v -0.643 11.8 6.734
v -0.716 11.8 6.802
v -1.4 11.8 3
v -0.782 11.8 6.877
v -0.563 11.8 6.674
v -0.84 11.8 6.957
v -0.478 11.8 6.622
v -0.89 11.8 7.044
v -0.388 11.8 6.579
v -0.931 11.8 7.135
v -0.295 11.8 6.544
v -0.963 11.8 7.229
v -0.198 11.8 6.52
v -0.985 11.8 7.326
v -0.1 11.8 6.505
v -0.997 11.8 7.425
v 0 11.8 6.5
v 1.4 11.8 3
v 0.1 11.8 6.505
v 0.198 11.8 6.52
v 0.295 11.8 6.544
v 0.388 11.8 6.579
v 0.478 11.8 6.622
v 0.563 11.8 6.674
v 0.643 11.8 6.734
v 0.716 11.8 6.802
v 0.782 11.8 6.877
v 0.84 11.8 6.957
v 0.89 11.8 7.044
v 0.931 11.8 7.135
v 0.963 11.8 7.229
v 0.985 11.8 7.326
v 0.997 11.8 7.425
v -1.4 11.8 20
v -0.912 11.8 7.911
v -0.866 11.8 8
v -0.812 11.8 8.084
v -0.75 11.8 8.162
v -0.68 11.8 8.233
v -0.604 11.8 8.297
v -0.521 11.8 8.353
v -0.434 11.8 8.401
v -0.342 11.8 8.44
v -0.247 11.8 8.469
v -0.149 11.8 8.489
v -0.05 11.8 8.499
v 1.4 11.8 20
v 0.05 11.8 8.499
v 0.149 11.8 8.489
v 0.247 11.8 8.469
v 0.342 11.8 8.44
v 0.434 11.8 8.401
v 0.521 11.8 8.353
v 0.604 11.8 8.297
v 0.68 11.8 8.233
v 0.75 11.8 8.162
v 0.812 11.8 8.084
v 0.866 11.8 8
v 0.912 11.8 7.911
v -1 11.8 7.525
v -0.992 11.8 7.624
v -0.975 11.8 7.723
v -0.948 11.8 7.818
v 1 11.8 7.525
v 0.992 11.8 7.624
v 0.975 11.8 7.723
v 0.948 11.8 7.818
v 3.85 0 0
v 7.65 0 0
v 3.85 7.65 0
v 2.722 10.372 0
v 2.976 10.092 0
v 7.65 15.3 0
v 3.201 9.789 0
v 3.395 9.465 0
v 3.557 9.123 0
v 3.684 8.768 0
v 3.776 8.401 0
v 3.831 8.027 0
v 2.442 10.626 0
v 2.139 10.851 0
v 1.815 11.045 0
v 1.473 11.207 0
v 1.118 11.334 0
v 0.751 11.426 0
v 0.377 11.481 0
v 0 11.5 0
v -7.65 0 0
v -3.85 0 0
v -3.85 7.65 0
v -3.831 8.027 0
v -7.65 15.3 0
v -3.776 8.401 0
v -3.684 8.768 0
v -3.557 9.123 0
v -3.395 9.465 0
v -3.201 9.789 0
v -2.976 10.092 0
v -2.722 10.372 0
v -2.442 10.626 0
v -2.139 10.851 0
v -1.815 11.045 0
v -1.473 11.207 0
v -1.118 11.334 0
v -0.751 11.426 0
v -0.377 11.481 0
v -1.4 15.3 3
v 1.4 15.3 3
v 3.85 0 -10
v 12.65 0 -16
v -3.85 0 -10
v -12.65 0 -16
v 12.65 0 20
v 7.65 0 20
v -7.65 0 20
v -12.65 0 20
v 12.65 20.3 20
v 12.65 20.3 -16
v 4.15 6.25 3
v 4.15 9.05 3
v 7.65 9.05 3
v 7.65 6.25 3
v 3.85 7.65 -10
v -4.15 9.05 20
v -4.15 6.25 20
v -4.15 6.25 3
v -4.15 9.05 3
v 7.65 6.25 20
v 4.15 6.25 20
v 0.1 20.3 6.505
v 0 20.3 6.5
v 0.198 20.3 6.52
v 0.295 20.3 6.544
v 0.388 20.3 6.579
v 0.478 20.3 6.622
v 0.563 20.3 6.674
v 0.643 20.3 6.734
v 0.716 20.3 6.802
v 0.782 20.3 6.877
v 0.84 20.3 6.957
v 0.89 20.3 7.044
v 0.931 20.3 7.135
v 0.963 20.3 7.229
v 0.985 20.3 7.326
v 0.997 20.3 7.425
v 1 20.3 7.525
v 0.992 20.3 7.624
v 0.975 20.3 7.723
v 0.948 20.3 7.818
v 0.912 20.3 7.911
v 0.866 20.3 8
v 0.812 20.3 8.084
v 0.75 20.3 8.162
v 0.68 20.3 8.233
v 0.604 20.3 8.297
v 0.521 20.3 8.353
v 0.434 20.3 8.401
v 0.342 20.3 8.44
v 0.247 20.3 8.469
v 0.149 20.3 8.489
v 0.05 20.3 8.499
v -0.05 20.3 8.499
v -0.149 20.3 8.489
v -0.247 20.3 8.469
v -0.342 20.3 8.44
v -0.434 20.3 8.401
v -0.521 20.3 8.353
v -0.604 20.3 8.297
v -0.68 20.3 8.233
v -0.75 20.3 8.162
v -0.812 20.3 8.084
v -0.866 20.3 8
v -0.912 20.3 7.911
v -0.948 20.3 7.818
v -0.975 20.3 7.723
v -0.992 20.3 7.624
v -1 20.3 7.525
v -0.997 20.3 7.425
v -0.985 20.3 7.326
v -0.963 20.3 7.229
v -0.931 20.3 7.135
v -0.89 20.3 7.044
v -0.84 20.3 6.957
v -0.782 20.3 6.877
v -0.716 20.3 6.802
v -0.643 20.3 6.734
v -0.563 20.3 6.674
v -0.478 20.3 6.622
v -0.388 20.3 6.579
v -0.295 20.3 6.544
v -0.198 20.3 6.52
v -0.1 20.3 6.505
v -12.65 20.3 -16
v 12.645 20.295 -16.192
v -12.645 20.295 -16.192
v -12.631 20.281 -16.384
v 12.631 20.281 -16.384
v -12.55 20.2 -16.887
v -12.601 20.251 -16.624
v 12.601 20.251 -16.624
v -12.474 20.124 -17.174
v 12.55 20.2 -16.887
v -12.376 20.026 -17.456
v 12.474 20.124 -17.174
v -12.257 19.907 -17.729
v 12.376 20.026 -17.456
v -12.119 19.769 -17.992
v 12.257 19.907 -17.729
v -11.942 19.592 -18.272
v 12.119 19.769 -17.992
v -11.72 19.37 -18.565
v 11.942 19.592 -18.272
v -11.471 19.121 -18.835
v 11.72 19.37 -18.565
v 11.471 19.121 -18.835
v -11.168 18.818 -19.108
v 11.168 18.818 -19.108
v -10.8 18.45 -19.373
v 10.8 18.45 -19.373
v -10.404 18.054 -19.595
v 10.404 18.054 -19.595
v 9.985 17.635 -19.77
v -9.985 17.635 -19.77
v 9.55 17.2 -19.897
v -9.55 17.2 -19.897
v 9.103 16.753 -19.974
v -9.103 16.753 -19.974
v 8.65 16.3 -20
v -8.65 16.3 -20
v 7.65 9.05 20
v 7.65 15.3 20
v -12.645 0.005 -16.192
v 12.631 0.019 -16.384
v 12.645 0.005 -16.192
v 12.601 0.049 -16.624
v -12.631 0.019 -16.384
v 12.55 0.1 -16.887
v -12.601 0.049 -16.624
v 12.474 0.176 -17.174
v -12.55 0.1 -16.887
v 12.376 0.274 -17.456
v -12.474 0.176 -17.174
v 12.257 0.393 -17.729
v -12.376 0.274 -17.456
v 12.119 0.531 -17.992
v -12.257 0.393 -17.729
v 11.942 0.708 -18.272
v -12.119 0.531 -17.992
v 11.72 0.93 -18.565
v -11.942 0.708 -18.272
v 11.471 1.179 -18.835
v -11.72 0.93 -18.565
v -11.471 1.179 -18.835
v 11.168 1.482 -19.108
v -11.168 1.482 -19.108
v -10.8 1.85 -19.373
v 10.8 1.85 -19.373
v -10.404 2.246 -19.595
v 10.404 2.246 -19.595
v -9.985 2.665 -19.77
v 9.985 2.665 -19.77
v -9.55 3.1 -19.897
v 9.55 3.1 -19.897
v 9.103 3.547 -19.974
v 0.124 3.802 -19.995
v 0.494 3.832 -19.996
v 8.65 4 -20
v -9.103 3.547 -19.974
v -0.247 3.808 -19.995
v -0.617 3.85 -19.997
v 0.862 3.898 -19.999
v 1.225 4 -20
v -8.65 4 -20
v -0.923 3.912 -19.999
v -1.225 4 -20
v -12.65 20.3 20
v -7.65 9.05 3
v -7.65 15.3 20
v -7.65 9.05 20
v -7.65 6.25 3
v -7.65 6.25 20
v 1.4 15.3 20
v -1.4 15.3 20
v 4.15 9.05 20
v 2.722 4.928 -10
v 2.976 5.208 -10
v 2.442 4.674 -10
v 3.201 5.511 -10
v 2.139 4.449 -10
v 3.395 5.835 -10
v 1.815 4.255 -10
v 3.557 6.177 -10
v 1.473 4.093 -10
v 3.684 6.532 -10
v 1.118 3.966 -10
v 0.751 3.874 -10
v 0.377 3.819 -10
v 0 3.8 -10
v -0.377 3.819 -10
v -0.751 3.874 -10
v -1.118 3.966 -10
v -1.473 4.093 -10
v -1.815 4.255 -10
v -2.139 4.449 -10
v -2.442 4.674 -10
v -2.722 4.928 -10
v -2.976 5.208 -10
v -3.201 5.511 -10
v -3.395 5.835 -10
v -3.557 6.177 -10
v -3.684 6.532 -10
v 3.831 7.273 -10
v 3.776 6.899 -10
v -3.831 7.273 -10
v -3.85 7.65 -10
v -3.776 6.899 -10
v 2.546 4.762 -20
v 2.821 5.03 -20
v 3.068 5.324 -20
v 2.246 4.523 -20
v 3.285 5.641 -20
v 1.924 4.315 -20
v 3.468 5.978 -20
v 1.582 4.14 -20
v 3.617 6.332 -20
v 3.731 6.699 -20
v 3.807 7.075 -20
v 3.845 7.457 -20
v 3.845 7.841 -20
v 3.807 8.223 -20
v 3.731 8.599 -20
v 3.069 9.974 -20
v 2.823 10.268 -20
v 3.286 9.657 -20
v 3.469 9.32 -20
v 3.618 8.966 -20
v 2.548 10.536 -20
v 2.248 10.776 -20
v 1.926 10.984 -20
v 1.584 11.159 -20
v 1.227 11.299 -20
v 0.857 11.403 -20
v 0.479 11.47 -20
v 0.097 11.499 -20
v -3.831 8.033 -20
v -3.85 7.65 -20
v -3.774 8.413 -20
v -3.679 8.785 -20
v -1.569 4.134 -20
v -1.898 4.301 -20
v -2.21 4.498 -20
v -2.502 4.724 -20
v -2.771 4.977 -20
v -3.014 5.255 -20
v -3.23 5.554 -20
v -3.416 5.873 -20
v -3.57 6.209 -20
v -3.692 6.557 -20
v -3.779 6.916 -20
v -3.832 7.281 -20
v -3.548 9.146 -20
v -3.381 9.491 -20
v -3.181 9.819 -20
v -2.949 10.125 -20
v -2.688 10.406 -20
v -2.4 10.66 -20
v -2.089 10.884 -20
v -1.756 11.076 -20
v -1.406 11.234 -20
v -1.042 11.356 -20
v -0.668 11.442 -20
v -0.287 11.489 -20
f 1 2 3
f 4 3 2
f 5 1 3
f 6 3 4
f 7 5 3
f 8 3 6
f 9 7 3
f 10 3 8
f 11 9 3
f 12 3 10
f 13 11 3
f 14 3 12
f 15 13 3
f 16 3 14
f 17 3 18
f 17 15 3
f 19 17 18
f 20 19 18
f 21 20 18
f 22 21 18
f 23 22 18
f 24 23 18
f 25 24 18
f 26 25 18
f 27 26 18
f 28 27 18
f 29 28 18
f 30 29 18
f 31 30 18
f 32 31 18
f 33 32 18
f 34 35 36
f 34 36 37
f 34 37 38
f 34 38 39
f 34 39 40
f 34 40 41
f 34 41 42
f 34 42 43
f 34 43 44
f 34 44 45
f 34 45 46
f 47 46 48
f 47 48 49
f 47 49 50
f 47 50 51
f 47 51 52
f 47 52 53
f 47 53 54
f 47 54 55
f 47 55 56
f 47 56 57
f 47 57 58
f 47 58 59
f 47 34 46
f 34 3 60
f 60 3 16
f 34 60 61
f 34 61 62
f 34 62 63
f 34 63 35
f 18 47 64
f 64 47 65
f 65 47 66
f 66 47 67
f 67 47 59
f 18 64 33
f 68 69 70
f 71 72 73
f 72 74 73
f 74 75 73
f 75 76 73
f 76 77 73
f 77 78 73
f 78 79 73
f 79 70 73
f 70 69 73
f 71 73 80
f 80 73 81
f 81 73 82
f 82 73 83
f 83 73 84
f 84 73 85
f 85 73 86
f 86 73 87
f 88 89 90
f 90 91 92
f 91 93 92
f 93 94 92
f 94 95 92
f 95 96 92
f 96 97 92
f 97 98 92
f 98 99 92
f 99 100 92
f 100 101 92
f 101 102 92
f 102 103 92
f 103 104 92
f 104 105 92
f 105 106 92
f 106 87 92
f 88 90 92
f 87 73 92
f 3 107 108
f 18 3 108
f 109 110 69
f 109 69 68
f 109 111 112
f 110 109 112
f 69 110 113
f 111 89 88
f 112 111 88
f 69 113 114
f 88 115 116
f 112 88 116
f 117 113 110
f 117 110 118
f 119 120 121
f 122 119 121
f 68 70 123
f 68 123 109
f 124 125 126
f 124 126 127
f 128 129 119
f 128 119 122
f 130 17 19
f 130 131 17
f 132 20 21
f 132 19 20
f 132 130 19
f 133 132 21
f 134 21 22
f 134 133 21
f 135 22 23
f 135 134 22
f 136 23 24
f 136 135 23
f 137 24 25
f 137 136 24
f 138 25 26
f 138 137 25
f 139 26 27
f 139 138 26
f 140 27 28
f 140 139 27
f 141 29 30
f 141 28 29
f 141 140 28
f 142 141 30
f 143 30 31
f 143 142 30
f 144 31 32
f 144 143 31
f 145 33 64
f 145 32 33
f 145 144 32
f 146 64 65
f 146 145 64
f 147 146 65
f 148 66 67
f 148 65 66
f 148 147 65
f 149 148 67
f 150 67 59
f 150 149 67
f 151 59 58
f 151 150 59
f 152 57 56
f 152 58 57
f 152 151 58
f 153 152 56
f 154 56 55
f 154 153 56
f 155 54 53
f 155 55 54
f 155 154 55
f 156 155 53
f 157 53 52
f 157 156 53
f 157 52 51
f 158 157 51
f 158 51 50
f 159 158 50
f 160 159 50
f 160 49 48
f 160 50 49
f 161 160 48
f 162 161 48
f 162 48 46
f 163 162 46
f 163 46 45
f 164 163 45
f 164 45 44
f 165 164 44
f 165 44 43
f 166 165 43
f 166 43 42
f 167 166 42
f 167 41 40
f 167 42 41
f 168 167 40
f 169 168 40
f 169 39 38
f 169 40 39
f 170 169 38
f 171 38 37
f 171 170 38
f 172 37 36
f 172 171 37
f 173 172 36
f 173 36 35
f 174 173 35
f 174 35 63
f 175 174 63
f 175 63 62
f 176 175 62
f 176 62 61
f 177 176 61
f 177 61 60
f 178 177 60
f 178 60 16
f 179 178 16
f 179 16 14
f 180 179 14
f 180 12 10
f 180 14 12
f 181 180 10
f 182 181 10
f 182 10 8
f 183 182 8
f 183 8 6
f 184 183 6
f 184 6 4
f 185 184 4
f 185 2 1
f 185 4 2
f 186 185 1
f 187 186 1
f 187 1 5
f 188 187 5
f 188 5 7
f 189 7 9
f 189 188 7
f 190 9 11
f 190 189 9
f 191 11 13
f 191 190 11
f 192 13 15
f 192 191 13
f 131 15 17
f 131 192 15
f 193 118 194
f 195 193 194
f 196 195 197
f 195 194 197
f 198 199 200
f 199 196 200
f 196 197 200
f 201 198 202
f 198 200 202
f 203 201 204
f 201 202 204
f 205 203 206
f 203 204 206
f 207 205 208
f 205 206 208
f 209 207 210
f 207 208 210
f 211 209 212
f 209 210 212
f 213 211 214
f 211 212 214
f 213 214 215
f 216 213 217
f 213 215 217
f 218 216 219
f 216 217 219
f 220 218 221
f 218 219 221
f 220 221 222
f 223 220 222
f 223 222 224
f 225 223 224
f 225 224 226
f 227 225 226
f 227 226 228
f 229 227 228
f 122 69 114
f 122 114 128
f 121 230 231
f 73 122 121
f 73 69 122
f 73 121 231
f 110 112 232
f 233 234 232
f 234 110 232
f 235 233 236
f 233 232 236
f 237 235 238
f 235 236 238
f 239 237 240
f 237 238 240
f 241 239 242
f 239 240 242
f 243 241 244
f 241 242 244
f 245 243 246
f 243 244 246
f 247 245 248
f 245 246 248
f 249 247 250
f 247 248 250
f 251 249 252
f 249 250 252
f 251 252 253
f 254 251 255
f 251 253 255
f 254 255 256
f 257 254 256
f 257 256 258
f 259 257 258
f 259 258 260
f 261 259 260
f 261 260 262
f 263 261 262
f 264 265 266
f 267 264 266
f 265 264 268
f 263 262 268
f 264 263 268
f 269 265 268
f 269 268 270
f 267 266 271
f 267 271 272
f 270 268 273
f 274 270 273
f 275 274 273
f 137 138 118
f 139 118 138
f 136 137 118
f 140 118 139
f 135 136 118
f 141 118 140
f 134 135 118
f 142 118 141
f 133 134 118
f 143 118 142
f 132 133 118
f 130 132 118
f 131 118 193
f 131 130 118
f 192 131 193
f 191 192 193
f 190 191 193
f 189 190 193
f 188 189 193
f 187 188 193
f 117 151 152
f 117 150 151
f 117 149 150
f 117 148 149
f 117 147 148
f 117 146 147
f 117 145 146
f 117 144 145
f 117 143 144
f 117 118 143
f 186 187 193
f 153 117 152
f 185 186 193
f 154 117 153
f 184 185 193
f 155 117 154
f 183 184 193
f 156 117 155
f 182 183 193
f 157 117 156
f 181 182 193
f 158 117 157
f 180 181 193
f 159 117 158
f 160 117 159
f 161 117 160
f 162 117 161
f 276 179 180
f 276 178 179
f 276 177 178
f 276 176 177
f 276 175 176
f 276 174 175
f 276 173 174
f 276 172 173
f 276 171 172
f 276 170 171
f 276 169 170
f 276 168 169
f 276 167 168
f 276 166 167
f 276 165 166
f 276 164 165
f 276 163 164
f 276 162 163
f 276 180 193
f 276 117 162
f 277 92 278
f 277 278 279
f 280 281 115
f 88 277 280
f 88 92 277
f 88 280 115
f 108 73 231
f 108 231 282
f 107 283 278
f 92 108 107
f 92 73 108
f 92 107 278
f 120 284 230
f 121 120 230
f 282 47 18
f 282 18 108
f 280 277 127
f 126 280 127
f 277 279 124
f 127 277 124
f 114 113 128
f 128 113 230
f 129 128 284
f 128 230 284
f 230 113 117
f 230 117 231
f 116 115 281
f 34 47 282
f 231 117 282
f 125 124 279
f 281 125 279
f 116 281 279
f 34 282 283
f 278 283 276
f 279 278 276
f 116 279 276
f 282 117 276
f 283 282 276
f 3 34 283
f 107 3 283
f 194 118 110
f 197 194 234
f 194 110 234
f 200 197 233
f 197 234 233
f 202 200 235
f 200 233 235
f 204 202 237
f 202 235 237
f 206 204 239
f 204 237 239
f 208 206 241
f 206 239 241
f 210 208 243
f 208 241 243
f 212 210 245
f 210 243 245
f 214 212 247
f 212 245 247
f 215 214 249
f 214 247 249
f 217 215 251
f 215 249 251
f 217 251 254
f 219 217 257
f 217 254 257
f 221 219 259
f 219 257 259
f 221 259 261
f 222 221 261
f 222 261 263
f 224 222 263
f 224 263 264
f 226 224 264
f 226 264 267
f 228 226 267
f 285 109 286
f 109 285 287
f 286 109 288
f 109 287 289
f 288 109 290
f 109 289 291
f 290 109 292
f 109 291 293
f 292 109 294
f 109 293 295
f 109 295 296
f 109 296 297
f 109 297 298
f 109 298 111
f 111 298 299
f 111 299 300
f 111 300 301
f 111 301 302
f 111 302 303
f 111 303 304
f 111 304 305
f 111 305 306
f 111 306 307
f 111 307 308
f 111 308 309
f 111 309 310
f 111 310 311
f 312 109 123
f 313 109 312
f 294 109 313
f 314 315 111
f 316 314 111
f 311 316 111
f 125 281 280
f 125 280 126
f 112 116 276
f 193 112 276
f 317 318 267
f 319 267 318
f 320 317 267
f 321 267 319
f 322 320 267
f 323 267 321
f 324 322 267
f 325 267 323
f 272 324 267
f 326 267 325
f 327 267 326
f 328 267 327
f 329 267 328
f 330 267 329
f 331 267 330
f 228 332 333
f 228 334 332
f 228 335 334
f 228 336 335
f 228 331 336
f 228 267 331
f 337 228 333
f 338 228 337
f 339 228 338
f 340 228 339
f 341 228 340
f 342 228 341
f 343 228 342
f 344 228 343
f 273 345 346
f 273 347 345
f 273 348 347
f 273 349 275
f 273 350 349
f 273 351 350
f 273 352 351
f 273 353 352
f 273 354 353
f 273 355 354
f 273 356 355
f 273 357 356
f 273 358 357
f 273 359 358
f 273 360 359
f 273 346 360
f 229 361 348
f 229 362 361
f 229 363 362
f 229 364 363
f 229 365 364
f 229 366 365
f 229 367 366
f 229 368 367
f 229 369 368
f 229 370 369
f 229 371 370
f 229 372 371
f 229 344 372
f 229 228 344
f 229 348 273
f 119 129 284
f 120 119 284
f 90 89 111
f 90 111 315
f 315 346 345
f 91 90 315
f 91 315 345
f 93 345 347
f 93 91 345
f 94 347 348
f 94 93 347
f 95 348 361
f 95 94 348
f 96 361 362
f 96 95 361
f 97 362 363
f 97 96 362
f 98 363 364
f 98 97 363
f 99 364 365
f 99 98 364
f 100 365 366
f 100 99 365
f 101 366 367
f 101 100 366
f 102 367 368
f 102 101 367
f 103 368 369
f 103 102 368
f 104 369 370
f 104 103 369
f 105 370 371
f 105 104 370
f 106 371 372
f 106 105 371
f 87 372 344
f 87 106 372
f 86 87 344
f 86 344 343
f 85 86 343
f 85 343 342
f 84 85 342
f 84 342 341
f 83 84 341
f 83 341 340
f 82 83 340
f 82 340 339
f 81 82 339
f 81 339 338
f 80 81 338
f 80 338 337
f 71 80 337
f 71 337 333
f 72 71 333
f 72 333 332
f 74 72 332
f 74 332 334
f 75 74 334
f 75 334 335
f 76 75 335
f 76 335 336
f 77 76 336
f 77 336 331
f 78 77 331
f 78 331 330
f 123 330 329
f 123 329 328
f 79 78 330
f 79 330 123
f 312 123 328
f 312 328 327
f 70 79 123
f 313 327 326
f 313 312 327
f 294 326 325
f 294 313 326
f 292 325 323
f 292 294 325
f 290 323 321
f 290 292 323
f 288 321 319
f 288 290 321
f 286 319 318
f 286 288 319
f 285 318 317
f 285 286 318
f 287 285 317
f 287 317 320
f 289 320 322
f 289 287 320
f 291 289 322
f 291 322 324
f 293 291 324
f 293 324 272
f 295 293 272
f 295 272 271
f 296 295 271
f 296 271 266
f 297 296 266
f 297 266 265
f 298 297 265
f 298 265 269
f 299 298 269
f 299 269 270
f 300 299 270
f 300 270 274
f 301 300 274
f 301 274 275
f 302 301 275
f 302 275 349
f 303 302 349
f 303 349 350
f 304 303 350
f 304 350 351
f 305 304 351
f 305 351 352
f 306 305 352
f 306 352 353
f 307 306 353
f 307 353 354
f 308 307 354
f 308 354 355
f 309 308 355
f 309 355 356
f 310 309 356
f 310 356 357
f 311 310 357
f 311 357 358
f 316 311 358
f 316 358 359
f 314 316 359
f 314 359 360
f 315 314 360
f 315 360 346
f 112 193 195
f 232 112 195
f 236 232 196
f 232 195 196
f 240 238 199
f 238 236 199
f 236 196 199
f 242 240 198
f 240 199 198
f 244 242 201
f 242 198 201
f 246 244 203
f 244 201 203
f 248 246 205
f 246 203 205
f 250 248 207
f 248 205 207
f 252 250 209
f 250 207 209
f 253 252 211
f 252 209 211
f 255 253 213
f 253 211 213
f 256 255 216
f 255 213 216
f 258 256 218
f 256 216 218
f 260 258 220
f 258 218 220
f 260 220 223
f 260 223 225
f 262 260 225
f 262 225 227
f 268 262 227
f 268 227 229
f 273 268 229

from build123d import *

# Parameters (mm, degrees)
RESSALTO_EXTRUS_O1_DEPTH   = 20
ESBO_O2_W                  = 25.3
ESBO_O2_H                  = 20.3
ESBO_O2_R                  = 3.85
RESSALTO_EXTRUS_O2_DEPTH   = 20
CORTE_EXTRUS_O1_DEPTH      = 10
ESBO_O3_W                  = 3.5
ESBO_O3_H                  = 2.8
ESBO_O3_W_2                = 2.8
ESBO_O3_H_2                = 3.5
RESSALTO_EXTRUS_O3_DEPTH   = 17
CORTE_EXTRUS_O2_DEPTH      = 29.180001774
CORTE_EXTRUS_O2_DEPTH_BACK = 29.180001774
ESBO_O4_R                  = 1
FILETE1_R                  = 4


with BuildPart() as part:
    # Esboço1 → Ressalto-extrusão1 (new body)
    with BuildSketch(Plane.XY):
        Polygon((-7.65, 0), (-12.65, 0), (-12.65, 20.3), (12.65, 20.3), (12.65, 0), (7.65, 0), (7.65, 15.3), (-7.65, 15.3), align=None)
    extrude(amount=RESSALTO_EXTRUS_O1_DEPTH)

    # Esboço2 → Ressalto-extrusão2 (add)
    with BuildSketch(Plane(origin=(0, 0, 0), x_dir=(-1, 0, 0), z_dir=(0, 0, -1))):
        with Locations((0, 10.15)):
            Rectangle(ESBO_O2_W, ESBO_O2_H)
        with Locations((0, 7.65)):
            Circle(ESBO_O2_R, mode=Mode.SUBTRACT)
    extrude(amount=RESSALTO_EXTRUS_O2_DEPTH)

    # Esboço2<3> → Corte-extrusão1 (cut)
    with BuildSketch(Plane(origin=(0, 0, 0), x_dir=(-1, 0, 0), z_dir=(0, 0, -1))):
        with BuildLine():
            Line((3.85, 3.8), (2.722361108, 4.927638892))
            ThreePointArc((2.722361108, 4.927638892), (-1.473331215, 4.0930638), (-3.85, 7.65))
            Line((-3.85, 7.65), (-3.85, 0))
            Line((-3.85, 0), (3.85, 0))
            Line((3.85, 0), (3.85, 3.8))
        make_face()
        with BuildLine():
            ThreePointArc((3.85, 7.65), (3.5569362, 6.176668785), (2.722361108, 4.927638892))
            Line((2.722361108, 4.927638892), (3.85, 3.8))
            Line((3.85, 3.8), (3.85, 7.65))
        make_face()
    extrude(amount=CORTE_EXTRUS_O1_DEPTH, mode=Mode.SUBTRACT)

    # Esboço3 → Ressalto-extrusão3 (add)
    with BuildSketch(Plane.XY.offset(20)):
        with Locations((5.9, 7.65)):
            Rectangle(ESBO_O3_W, ESBO_O3_H)
        with Locations((-5.9, 7.65)):
            Rectangle(ESBO_O3_W, ESBO_O3_H)
        with Locations((0, 13.55)):
            Rectangle(ESBO_O3_W_2, ESBO_O3_H_2)
    extrude(amount=-RESSALTO_EXTRUS_O3_DEPTH)

    # Esboço4 → Corte-extrusão2 (cut, two sides: drawn at the far end of the back side and taken through both)
    with BuildSketch(Plane.XZ.offset(-15.3).offset(-CORTE_EXTRUS_O2_DEPTH_BACK)):
        with Locations(Location((0, 7.5, 0), (0, 0, 270))):
            Circle(ESBO_O4_R)
    extrude(amount=CORTE_EXTRUS_O2_DEPTH + CORTE_EXTRUS_O2_DEPTH_BACK, mode=Mode.SUBTRACT)

    # Filete1
    # the kernel refuses this fillet: 4 mm, written as the material it takes off along each edge
    with BuildSketch(Plane(origin=(12.65, -10, -20), x_dir=(-1, 0, 0), z_dir=(0, 1, 0))) as filete1_piece_1:
        with BuildLine():
            CenterArc((FILETE1_R, FILETE1_R), FILETE1_R, 180, 90)
            Line((0, FILETE1_R), (0, 0))
            Line((0, 0), (FILETE1_R, 0))
        make_face()
    extrude(amount=40.3, mode=Mode.SUBTRACT)
    with BuildSketch(Plane(origin=(-22.65, 0, -20), x_dir=(0, 0, 1), z_dir=(1, 0, 0)), Plane(origin=(22.65, 20.3, -20), x_dir=(0, 0, 1), z_dir=(-1, 0, 0))) as filete1_piece_2:
        with BuildLine():
            CenterArc((FILETE1_R, -FILETE1_R), FILETE1_R, 90, 90)
            Line((0, -FILETE1_R), (0, 0))
            Line((0, 0), (FILETE1_R, 0))
        make_face()
    extrude(amount=45.3, mode=Mode.SUBTRACT)
    with BuildSketch(Plane(origin=(-12.65, 30.3, -20), x_dir=(0, 0, 1), z_dir=(0, -1, 0))) as filete1_piece_3:
        with BuildLine():
            CenterArc((FILETE1_R, -FILETE1_R), FILETE1_R, 90, 90)
            Line((0, -FILETE1_R), (0, 0))
            Line((0, 0), (FILETE1_R, 0))
        make_face()
    extrude(amount=40.3, mode=Mode.SUBTRACT)


solid = part.part
